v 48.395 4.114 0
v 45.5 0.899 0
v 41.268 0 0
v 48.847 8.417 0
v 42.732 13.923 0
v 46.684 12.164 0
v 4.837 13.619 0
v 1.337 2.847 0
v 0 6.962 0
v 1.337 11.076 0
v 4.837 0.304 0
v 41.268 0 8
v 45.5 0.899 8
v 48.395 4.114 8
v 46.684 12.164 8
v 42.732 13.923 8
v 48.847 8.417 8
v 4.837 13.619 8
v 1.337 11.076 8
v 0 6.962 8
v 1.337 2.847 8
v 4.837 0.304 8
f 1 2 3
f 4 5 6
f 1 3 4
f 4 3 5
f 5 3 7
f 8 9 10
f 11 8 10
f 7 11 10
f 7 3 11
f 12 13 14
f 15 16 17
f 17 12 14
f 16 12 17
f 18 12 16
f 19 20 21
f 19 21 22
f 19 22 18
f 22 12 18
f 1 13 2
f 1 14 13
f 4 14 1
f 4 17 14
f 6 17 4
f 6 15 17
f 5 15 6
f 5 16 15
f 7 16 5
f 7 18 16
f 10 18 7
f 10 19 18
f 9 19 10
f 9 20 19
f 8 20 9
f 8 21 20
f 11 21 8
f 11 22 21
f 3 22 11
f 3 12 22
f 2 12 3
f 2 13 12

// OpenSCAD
$fn = 32;

// ----------------------------------------------------------------------
// Lever arm: two bosses 14 and 14 mm, 35 mm between centres
// ----------------------------------------------------------------------

// --- parameters (mm) ---
profile_height = 8;       // extrusion height
profile_points = 11;      // points of the closed outline

profile = [[0, 6.962], [1.337, 2.847], [4.837, 0.304], [41.268, 0], [45.5, 0.899], [48.395, 4.114], [48.847, 8.417], [46.684, 12.164], [42.732, 13.923], [4.837, 13.619], [1.337, 11.076]];  // single closed polygon, 11 points, counter clockwise

// --- the one profile operation ---
linear_extrude(height = profile_height) polygon(points = profile);
